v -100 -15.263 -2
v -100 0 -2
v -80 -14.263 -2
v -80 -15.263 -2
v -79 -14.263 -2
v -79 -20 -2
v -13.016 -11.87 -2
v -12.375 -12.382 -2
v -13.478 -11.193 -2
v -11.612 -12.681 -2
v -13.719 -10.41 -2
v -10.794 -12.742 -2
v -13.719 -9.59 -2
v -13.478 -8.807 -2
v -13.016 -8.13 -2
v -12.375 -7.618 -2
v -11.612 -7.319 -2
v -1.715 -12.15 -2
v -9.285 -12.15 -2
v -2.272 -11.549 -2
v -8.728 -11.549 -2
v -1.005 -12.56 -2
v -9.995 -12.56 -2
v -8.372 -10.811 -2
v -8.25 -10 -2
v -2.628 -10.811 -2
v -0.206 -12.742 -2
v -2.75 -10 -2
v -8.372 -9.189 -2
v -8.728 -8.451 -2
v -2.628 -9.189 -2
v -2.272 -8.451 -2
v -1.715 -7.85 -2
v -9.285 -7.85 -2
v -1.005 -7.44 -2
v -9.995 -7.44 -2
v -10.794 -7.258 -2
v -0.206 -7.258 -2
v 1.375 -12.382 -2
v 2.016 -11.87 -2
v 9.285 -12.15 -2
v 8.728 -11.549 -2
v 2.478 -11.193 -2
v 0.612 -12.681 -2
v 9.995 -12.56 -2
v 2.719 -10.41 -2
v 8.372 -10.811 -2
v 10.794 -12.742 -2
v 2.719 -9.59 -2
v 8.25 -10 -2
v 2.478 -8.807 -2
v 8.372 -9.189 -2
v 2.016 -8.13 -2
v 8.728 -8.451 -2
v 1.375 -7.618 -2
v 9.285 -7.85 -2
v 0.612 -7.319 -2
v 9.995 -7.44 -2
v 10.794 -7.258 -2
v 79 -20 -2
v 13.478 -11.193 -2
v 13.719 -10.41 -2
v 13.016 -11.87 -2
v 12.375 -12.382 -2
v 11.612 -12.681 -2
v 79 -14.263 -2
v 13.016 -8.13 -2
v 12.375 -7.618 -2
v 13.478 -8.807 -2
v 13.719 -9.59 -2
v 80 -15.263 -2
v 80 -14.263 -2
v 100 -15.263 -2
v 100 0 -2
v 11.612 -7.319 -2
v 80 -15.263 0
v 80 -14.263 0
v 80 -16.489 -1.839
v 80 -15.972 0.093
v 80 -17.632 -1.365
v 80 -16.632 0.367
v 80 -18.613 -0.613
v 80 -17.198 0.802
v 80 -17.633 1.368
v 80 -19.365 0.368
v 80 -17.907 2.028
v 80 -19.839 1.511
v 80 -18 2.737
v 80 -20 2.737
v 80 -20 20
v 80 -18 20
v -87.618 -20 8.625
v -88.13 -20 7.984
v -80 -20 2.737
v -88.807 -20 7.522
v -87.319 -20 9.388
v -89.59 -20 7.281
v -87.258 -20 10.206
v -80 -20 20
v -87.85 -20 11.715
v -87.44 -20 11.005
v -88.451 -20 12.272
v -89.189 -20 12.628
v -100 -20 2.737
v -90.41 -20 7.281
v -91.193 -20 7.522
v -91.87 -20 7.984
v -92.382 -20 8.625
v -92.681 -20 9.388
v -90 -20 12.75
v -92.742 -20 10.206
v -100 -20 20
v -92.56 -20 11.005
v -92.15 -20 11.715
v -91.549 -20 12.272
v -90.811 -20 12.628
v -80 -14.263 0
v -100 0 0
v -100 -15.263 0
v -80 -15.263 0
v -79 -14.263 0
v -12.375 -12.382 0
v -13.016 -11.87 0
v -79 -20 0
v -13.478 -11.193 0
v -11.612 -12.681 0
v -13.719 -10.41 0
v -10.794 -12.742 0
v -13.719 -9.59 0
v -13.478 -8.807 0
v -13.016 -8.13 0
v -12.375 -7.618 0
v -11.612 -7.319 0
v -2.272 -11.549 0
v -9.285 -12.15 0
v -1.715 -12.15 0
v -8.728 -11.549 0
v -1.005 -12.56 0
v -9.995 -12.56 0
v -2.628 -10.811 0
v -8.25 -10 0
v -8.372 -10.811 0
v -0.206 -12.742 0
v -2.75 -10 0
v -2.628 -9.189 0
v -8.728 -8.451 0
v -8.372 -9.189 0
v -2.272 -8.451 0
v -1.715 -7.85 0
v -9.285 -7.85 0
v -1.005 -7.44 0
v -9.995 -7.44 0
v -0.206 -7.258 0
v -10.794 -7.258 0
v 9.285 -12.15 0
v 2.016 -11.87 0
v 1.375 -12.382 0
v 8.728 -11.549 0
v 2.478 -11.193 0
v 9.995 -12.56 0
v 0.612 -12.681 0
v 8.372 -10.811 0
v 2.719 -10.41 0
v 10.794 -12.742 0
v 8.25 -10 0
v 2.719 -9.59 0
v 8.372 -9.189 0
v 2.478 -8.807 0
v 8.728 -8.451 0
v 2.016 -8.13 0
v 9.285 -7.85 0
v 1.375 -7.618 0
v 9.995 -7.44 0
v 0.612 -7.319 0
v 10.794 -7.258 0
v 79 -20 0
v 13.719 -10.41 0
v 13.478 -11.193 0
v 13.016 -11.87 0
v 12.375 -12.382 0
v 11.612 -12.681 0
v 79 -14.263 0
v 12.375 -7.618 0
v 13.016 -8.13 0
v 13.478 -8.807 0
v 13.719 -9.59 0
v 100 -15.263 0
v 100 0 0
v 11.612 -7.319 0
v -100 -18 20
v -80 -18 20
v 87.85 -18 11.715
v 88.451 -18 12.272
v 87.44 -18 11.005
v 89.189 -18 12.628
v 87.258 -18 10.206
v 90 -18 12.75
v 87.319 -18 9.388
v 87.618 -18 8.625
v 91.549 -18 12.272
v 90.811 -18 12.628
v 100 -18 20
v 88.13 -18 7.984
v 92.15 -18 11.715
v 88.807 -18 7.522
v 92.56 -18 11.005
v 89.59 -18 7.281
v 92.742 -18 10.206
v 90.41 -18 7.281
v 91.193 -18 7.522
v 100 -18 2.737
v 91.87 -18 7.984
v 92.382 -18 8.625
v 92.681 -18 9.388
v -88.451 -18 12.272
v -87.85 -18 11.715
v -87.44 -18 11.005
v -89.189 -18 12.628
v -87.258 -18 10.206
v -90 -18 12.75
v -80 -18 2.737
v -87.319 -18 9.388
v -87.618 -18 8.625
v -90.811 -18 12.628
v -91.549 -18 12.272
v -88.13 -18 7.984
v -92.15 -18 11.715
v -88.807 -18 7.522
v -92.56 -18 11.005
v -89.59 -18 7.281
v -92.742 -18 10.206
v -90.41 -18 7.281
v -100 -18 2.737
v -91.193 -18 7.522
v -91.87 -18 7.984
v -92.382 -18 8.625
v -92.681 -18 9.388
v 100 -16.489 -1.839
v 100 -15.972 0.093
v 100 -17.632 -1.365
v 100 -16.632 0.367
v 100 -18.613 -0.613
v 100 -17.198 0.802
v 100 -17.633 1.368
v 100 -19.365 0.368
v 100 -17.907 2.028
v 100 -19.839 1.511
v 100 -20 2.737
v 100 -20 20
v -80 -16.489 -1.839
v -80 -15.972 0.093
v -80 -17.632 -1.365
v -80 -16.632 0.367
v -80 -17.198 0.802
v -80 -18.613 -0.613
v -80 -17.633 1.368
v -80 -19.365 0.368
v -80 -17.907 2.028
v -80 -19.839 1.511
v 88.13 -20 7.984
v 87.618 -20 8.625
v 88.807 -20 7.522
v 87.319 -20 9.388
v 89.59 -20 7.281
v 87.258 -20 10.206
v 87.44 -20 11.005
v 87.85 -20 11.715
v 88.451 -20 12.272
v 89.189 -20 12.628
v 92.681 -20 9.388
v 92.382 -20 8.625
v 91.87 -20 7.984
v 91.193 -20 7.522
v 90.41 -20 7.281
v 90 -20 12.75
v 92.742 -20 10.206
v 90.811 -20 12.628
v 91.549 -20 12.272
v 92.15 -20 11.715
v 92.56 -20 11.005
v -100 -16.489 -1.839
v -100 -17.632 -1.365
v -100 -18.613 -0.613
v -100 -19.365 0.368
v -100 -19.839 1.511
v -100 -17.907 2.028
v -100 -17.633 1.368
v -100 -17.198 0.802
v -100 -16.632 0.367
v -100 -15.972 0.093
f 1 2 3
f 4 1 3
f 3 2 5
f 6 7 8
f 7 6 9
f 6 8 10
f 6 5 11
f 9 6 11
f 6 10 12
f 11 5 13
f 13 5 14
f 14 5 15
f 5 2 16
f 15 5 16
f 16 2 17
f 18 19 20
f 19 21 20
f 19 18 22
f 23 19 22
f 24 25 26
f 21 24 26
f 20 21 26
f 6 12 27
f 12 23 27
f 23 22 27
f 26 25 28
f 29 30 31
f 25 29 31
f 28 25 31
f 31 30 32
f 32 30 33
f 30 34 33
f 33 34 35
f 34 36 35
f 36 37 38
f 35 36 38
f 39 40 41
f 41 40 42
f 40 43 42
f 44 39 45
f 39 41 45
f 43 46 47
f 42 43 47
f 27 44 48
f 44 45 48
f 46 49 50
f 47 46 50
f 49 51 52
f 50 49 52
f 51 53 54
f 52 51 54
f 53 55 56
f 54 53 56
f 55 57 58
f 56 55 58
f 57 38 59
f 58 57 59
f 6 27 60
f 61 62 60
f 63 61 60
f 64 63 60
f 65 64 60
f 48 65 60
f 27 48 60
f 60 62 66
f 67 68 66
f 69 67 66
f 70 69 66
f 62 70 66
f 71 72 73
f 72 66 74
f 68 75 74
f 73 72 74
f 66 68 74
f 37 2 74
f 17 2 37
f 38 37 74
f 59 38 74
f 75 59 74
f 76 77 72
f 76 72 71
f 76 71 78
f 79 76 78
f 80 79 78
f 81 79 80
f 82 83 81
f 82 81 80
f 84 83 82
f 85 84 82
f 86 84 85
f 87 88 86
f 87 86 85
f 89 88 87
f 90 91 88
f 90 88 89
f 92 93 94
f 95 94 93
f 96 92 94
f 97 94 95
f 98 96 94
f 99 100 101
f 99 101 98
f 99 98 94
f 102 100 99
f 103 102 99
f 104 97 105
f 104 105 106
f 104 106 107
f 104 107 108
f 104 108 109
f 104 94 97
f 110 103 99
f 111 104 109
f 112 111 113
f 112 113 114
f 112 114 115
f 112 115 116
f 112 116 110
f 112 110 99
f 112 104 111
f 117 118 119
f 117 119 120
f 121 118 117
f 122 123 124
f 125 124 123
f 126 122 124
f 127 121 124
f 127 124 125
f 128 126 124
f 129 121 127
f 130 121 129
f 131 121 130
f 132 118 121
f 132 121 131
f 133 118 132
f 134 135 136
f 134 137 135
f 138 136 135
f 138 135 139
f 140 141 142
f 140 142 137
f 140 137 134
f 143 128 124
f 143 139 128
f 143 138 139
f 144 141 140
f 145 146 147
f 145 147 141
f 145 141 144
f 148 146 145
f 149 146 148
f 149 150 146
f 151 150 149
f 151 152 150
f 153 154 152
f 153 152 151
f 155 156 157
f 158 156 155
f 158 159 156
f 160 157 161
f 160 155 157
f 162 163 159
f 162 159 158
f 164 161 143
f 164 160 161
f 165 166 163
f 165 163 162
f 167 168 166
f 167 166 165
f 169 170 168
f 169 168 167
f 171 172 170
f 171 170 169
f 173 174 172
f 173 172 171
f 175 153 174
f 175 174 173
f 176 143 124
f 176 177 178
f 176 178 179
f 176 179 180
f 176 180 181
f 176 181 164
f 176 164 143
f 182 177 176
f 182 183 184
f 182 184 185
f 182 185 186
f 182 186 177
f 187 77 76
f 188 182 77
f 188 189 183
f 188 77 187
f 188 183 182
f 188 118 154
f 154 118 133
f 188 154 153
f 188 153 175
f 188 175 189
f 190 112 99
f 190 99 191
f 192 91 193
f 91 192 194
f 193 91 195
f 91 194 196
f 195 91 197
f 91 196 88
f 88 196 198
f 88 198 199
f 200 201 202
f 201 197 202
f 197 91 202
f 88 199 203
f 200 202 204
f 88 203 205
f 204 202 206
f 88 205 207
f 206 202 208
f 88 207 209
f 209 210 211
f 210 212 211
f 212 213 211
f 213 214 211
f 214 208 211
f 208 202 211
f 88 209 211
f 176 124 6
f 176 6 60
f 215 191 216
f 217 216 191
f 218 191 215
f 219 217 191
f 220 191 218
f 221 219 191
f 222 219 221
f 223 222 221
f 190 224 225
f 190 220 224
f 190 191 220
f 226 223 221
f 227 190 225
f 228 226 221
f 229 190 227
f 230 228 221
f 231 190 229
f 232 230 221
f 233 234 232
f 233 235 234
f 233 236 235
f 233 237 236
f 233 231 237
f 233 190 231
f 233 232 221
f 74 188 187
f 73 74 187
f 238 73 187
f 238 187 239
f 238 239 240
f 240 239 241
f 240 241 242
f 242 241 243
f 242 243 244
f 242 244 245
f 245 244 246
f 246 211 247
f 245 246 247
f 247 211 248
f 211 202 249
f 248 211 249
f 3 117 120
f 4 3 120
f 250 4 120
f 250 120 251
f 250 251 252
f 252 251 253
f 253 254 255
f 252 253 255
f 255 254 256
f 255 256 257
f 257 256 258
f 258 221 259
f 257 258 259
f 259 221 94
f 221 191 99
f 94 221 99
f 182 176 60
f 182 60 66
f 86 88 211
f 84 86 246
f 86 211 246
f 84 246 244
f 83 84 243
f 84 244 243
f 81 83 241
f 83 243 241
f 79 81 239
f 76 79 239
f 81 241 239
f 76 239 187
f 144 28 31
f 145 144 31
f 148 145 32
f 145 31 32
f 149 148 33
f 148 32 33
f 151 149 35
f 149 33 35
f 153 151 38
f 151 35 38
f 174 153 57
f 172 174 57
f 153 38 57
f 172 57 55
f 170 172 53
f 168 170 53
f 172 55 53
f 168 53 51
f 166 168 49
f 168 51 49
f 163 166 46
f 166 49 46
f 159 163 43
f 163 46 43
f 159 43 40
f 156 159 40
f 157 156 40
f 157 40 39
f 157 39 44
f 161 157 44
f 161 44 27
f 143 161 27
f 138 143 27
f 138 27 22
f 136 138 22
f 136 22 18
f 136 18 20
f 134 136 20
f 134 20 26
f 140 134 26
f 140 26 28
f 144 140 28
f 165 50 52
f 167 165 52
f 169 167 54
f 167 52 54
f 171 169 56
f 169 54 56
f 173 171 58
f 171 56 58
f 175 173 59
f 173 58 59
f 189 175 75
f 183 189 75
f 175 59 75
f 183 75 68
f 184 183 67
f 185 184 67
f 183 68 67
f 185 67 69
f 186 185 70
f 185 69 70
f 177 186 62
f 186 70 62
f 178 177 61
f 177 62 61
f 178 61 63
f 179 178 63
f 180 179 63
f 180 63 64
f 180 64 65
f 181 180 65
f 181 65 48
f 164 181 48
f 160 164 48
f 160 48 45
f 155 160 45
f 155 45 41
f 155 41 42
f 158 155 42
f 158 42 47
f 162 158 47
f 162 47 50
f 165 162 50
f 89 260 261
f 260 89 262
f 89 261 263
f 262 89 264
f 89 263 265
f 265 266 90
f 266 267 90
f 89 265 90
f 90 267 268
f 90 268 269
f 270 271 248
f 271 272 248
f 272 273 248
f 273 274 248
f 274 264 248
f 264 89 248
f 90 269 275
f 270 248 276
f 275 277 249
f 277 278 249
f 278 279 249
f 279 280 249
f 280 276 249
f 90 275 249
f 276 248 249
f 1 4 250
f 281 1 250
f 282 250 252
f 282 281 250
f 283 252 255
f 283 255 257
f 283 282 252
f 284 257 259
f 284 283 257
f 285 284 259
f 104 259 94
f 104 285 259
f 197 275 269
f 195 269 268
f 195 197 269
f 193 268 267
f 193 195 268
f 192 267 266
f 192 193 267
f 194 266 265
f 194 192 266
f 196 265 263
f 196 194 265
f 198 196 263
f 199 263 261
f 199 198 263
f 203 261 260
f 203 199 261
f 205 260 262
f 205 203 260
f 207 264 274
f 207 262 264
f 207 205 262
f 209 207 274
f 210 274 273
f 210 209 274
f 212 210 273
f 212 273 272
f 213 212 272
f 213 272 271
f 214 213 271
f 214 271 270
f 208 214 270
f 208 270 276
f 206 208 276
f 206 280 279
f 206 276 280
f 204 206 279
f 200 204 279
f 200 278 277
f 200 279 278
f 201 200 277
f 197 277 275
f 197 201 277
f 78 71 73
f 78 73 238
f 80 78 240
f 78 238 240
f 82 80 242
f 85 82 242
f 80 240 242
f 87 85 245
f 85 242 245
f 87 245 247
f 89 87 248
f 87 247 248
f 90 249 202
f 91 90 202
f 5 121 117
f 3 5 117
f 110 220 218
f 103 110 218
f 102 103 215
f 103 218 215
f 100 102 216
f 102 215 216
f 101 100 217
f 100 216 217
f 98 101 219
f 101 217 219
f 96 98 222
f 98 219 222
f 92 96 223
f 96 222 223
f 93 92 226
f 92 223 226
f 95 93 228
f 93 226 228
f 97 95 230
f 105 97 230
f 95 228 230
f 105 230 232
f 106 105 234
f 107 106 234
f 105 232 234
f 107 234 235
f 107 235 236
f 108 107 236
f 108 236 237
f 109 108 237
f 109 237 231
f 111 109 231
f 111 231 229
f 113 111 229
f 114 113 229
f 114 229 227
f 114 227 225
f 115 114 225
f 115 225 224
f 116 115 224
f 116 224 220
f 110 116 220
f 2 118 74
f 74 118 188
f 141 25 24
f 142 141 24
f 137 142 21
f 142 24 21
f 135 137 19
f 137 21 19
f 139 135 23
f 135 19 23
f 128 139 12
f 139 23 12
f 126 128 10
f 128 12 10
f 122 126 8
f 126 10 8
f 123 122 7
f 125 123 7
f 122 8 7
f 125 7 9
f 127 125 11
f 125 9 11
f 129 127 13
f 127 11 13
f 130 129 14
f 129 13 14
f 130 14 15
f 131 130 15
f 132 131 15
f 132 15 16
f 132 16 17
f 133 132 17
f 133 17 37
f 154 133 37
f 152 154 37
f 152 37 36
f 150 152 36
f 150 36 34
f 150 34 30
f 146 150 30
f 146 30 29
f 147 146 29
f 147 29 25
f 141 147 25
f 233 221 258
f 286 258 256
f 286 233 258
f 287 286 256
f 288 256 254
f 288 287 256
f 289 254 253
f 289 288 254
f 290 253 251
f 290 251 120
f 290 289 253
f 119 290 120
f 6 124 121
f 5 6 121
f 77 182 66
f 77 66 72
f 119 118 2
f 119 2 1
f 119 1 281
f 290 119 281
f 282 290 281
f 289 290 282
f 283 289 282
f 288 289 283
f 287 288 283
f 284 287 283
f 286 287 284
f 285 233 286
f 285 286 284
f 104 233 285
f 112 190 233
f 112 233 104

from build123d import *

# Parameters (mm, degrees)
SKETCH_1_W                        = 200
SKETCH_1_H                        = 20
SM_BASE_FLANGE_1_DEPTH            = 2
SM_EDGE_FLANGE_1_STRIP_W          = 13.4732
SM_EDGE_FLANGE_1_STRIP_H          = 2
SM_EDGE_FLANGE_1_STRIP_CUT_DEPTH  = 20
SM_EDGE_FLANGE_1_RELIEF_W         = 14.4732
SM_EDGE_FLANGE_1_RELIEF_H         = 1
SM_EDGE_FLANGE_1_RELIEF_CUT_DEPTH = 2
SM_EDGE_FLANGE_1_DEPTH            = 20
SKETCH_10_R                       = 2.75
CUT_EXTRUDE_2_DEPTH               = 10
SKETCH_11_R                       = 2.75
CUT_EXTRUDE_3_DEPTH               = 10


# Sheet-metal steps are written as plain solids
with BuildPart() as part:
    # Sketch 1 → 基体-法兰1 (new body)
    with BuildSketch(Plane.XY):
        with Locations((0, -10)):
            Rectangle(SKETCH_1_W, SKETCH_1_H)
    extrude(amount=-SM_BASE_FLANGE_1_DEPTH)

    # 边线-法兰1 strip (across the edge) → 边线-法兰1 strip cut (cut)
    with BuildSketch(Plane(origin=(-100, -20, 0), x_dir=(0, 1, 0), z_dir=(1, 0, 0))):
        with Locations((-2, -1)):
            Rectangle(SM_EDGE_FLANGE_1_STRIP_W, SM_EDGE_FLANGE_1_STRIP_H)
    sm_edge_flange_1_strip_cut = extrude(amount=SM_EDGE_FLANGE_1_STRIP_CUT_DEPTH, mode=Mode.SUBTRACT)

    # 边线-法兰1 relief (on the sheet) → 边线-法兰1 relief cut (cut)
    with BuildSketch(Plane(origin=(-100, -15.2634, 0), x_dir=(0, 1, 0), z_dir=(0, 0, 1))):
        with Locations((-6.2366, -20.5)):
            Rectangle(SM_EDGE_FLANGE_1_RELIEF_W, SM_EDGE_FLANGE_1_RELIEF_H)
    sm_edge_flange_1_relief_cut = extrude(amount=-SM_EDGE_FLANGE_1_RELIEF_CUT_DEPTH, mode=Mode.SUBTRACT)

    # 边线-法兰1 section (across the edge) → 边线-法兰1 (add)
    with BuildSketch(Plane(origin=(-100, -20, 0), x_dir=(0, 1, 0), z_dir=(1, 0, 0))):
        with BuildLine():
            Line((0, 2.7366), (0, 20))
            Line((0, 20), (2, 20))
            Line((2, 20), (2, 2.7366))
            ThreePointArc((2, 2.7366), (2.801531583, 0.801531583), (4.7366, 0))
            Line((4.7366, 0), (4.7366, -2))
            ThreePointArc((4.7366, -2), (1.38731802, -0.61268198), (0, 2.7366))
        make_face()
    sm_edge_flange_1 = extrude(amount=SM_EDGE_FLANGE_1_DEPTH)

    # 草图10 → 切除-拉伸2 (cut)
    with BuildSketch(Plane(origin=(0, -18, 0), x_dir=(1, 0, 0), z_dir=(0, 1, 0))):
        with Locations(Location((-90, -10, 0), (0, 0, 270))):
            Circle(SKETCH_10_R)
    cut_extrude_2 = extrude(amount=-CUT_EXTRUDE_2_DEPTH, mode=Mode.SUBTRACT)

    # 镜向1: 边线-法兰1 strip cut, 边线-法兰1 relief cut, 边线-法兰1, 切除-拉伸2 across plane
    add(sm_edge_flange_1_strip_cut.mirror(Plane(origin=(0, 0, 0), x_dir=(0, 0, 1), z_dir=(1, 0, 0))), mode=Mode.SUBTRACT)
    add(sm_edge_flange_1_relief_cut.mirror(Plane(origin=(0, 0, 0), x_dir=(0, 0, 1), z_dir=(1, 0, 0))), mode=Mode.SUBTRACT)
    add(sm_edge_flange_1.mirror(Plane(origin=(0, 0, 0), x_dir=(0, 0, 1), z_dir=(1, 0, 0))))
    add(cut_extrude_2.mirror(Plane(origin=(0, 0, 0), x_dir=(0, 0, 1), z_dir=(1, 0, 0))), mode=Mode.SUBTRACT)

    # 草图11 → 切除-拉伸3 (cut)
    with BuildSketch(Plane(origin=(0, 0, -2), x_dir=(-1, 0, 0), z_dir=(0, 0, -1))):
        with Locations((0, -10)):
            Circle(SKETCH_11_R)
        with Locations((-11, -10)):
            Circle(SKETCH_11_R)
        with Locations(Location((11, -10, 0), (0, 0, 180))):
            Circle(SKETCH_11_R)
    extrude(amount=-CUT_EXTRUDE_3_DEPTH, mode=Mode.SUBTRACT)


solid = part.part
